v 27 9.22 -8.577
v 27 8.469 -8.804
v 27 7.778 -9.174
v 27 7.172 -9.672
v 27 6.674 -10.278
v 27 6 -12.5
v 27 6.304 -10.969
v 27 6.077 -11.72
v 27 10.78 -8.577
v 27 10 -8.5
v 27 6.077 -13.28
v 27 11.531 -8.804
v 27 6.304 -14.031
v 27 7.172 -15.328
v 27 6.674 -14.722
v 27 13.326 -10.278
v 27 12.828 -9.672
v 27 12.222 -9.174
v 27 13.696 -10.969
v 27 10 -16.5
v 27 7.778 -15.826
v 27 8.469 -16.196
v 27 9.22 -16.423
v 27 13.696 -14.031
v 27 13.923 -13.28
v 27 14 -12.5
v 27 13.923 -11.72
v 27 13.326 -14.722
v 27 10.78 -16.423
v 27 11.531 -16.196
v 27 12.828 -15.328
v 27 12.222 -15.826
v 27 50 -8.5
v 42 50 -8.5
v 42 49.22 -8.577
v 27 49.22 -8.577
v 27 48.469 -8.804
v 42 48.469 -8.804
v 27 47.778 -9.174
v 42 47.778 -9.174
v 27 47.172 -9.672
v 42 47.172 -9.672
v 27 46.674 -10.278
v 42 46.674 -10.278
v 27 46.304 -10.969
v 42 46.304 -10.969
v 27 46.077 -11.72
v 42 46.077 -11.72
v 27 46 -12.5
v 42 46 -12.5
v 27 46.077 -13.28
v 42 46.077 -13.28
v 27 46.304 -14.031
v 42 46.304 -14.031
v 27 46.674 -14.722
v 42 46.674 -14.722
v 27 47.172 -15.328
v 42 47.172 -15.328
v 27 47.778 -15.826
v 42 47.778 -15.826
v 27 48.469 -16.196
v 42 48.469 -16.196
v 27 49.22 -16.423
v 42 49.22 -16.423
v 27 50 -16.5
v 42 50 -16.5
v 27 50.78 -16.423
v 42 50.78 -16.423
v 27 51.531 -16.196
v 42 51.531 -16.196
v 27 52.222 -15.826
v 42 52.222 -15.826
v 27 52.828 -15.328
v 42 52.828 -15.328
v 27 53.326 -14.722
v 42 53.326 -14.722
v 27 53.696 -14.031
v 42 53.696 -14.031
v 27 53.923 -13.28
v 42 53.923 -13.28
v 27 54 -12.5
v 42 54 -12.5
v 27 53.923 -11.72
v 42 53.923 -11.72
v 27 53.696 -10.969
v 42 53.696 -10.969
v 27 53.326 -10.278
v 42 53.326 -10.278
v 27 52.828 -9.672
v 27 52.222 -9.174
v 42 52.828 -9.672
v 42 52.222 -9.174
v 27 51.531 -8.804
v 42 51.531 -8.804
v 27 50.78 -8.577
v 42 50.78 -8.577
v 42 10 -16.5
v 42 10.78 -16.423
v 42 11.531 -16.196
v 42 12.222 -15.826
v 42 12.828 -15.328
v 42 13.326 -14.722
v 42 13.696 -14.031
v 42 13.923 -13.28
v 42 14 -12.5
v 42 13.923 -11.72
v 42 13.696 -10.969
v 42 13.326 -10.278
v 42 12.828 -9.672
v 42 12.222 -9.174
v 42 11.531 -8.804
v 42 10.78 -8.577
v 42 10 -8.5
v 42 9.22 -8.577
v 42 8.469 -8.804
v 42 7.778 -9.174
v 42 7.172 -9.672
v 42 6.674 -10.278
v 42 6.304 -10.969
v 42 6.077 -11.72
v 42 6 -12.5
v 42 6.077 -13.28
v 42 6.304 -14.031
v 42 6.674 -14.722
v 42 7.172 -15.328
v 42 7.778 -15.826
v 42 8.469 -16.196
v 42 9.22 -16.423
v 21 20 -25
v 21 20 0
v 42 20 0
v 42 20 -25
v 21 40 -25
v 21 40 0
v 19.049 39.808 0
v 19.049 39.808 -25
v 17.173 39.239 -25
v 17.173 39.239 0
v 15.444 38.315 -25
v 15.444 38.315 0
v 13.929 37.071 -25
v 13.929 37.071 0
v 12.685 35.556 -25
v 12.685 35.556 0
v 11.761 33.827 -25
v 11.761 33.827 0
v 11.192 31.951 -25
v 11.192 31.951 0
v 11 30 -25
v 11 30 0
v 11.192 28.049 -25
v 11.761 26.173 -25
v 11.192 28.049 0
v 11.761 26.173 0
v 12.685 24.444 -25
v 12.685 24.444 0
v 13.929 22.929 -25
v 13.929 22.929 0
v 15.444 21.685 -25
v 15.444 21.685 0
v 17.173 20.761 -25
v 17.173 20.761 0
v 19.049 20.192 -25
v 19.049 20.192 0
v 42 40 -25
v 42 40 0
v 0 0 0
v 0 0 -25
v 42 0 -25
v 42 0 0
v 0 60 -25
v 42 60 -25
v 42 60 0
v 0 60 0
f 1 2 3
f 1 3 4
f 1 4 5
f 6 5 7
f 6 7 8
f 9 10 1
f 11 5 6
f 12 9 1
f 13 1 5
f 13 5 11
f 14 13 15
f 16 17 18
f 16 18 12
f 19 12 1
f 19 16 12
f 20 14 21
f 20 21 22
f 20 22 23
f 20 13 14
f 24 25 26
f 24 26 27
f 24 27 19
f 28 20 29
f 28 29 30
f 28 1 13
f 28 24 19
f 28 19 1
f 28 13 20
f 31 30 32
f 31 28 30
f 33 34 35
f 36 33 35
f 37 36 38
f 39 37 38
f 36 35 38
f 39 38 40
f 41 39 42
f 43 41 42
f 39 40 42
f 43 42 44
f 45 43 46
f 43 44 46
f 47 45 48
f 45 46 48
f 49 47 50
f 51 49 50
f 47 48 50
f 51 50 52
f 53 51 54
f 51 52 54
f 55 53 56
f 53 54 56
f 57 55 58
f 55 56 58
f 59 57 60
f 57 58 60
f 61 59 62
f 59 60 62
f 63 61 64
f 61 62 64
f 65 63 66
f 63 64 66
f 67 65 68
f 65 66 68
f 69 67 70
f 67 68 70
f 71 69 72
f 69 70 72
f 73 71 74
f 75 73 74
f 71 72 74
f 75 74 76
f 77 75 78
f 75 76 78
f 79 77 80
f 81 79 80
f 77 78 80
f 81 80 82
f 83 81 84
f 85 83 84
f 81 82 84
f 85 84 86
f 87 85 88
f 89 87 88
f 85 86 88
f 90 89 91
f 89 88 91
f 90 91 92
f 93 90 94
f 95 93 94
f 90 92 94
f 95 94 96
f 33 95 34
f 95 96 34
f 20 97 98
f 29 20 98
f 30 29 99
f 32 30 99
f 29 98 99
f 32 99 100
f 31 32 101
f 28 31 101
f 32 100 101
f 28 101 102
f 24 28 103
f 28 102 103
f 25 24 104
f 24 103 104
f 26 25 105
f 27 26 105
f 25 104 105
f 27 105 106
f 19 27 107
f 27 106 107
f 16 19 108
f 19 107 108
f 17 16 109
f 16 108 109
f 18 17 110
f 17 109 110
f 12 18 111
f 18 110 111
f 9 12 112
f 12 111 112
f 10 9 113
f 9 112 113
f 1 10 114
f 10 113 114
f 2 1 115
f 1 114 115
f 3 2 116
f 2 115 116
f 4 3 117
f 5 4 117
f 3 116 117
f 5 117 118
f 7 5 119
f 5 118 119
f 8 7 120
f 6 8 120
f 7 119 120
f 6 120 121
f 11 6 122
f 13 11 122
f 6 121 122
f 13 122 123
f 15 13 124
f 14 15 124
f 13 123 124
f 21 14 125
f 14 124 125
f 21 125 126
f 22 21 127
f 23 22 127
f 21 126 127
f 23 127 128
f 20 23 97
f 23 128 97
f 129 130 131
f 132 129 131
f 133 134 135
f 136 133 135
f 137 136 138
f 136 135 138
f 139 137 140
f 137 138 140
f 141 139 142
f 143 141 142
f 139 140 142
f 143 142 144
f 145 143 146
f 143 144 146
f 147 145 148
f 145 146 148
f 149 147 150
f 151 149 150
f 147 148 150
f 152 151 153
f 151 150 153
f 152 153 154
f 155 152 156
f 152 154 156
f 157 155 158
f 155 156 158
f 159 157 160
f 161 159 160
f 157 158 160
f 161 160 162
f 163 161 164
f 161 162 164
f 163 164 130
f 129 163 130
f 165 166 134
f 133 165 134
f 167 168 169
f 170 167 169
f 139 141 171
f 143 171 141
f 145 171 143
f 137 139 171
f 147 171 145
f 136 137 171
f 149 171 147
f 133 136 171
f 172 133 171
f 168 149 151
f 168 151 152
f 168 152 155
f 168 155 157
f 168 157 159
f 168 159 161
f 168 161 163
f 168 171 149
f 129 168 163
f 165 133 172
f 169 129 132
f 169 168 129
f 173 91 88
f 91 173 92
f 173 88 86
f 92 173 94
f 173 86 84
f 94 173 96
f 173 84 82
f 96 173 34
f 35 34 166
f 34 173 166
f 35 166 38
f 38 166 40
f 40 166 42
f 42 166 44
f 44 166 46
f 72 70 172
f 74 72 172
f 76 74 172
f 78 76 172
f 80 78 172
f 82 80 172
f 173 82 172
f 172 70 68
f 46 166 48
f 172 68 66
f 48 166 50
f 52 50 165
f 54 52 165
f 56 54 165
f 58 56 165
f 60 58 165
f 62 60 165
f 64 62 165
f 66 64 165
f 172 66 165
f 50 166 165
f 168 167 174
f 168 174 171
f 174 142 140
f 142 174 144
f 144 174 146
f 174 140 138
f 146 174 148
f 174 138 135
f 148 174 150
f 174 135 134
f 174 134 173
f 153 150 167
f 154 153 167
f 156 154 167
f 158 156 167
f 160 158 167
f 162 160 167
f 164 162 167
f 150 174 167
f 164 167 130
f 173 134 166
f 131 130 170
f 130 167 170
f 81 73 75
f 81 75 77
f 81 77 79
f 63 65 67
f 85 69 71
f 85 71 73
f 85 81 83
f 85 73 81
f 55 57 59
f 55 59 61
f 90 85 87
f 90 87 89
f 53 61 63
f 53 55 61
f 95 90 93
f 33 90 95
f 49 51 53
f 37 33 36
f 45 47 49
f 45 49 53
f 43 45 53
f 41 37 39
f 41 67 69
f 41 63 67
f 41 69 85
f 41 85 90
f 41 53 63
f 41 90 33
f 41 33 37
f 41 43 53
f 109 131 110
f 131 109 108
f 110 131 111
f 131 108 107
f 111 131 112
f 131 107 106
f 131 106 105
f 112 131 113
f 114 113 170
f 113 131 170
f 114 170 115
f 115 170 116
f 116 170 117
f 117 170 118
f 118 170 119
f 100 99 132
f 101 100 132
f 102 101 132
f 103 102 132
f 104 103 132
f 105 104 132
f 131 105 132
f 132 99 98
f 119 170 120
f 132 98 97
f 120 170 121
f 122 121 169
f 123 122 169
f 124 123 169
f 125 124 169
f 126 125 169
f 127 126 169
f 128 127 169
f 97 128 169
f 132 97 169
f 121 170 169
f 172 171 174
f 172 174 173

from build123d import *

# Parameters (mm, degrees)
SKETCH1_W           = 42
SKETCH1_H           = 25
BOSS_EXTRUDE1_DEPTH = 60
CUT_EXTRUDE1_DEPTH  = 56
SKETCH3_R           = 4
CUT_EXTRUDE2_DEPTH  = 15


with BuildPart() as part:
    # Sketch1 → Boss-Extrude1 (new body)
    with BuildSketch(Plane(origin=(0, 0, 0), x_dir=(1, 0, 0), z_dir=(0, 1, 0))):
        with Locations((21, 12.5)):
            Rectangle(SKETCH1_W, SKETCH1_H)
    extrude(amount=BOSS_EXTRUDE1_DEPTH)

    # Sketch2 → Cut-Extrude1 (cut)
    with BuildSketch(Plane.XY):
        with BuildLine():
            Line((42, 40), (21, 40))
            ThreePointArc((21, 40), (11, 30), (21, 20))
            Line((21, 20), (42, 20))
            Line((42, 20), (42, 40))
        make_face()
    extrude(amount=-CUT_EXTRUDE1_DEPTH, mode=Mode.SUBTRACT)

    # Sketch3 → Cut-Extrude2 (cut)
    with BuildSketch(Plane(origin=(42, 0, 0), x_dir=(0, 0, -1), z_dir=(1, 0, 0))):
        with Locations((12.5, 10)):
            Circle(SKETCH3_R)
        with Locations(Location((12.5, 50, 0), (0, 0, 180))):
            Circle(SKETCH3_R)
    extrude(amount=-CUT_EXTRUDE2_DEPTH, mode=Mode.SUBTRACT)


solid = part.part
